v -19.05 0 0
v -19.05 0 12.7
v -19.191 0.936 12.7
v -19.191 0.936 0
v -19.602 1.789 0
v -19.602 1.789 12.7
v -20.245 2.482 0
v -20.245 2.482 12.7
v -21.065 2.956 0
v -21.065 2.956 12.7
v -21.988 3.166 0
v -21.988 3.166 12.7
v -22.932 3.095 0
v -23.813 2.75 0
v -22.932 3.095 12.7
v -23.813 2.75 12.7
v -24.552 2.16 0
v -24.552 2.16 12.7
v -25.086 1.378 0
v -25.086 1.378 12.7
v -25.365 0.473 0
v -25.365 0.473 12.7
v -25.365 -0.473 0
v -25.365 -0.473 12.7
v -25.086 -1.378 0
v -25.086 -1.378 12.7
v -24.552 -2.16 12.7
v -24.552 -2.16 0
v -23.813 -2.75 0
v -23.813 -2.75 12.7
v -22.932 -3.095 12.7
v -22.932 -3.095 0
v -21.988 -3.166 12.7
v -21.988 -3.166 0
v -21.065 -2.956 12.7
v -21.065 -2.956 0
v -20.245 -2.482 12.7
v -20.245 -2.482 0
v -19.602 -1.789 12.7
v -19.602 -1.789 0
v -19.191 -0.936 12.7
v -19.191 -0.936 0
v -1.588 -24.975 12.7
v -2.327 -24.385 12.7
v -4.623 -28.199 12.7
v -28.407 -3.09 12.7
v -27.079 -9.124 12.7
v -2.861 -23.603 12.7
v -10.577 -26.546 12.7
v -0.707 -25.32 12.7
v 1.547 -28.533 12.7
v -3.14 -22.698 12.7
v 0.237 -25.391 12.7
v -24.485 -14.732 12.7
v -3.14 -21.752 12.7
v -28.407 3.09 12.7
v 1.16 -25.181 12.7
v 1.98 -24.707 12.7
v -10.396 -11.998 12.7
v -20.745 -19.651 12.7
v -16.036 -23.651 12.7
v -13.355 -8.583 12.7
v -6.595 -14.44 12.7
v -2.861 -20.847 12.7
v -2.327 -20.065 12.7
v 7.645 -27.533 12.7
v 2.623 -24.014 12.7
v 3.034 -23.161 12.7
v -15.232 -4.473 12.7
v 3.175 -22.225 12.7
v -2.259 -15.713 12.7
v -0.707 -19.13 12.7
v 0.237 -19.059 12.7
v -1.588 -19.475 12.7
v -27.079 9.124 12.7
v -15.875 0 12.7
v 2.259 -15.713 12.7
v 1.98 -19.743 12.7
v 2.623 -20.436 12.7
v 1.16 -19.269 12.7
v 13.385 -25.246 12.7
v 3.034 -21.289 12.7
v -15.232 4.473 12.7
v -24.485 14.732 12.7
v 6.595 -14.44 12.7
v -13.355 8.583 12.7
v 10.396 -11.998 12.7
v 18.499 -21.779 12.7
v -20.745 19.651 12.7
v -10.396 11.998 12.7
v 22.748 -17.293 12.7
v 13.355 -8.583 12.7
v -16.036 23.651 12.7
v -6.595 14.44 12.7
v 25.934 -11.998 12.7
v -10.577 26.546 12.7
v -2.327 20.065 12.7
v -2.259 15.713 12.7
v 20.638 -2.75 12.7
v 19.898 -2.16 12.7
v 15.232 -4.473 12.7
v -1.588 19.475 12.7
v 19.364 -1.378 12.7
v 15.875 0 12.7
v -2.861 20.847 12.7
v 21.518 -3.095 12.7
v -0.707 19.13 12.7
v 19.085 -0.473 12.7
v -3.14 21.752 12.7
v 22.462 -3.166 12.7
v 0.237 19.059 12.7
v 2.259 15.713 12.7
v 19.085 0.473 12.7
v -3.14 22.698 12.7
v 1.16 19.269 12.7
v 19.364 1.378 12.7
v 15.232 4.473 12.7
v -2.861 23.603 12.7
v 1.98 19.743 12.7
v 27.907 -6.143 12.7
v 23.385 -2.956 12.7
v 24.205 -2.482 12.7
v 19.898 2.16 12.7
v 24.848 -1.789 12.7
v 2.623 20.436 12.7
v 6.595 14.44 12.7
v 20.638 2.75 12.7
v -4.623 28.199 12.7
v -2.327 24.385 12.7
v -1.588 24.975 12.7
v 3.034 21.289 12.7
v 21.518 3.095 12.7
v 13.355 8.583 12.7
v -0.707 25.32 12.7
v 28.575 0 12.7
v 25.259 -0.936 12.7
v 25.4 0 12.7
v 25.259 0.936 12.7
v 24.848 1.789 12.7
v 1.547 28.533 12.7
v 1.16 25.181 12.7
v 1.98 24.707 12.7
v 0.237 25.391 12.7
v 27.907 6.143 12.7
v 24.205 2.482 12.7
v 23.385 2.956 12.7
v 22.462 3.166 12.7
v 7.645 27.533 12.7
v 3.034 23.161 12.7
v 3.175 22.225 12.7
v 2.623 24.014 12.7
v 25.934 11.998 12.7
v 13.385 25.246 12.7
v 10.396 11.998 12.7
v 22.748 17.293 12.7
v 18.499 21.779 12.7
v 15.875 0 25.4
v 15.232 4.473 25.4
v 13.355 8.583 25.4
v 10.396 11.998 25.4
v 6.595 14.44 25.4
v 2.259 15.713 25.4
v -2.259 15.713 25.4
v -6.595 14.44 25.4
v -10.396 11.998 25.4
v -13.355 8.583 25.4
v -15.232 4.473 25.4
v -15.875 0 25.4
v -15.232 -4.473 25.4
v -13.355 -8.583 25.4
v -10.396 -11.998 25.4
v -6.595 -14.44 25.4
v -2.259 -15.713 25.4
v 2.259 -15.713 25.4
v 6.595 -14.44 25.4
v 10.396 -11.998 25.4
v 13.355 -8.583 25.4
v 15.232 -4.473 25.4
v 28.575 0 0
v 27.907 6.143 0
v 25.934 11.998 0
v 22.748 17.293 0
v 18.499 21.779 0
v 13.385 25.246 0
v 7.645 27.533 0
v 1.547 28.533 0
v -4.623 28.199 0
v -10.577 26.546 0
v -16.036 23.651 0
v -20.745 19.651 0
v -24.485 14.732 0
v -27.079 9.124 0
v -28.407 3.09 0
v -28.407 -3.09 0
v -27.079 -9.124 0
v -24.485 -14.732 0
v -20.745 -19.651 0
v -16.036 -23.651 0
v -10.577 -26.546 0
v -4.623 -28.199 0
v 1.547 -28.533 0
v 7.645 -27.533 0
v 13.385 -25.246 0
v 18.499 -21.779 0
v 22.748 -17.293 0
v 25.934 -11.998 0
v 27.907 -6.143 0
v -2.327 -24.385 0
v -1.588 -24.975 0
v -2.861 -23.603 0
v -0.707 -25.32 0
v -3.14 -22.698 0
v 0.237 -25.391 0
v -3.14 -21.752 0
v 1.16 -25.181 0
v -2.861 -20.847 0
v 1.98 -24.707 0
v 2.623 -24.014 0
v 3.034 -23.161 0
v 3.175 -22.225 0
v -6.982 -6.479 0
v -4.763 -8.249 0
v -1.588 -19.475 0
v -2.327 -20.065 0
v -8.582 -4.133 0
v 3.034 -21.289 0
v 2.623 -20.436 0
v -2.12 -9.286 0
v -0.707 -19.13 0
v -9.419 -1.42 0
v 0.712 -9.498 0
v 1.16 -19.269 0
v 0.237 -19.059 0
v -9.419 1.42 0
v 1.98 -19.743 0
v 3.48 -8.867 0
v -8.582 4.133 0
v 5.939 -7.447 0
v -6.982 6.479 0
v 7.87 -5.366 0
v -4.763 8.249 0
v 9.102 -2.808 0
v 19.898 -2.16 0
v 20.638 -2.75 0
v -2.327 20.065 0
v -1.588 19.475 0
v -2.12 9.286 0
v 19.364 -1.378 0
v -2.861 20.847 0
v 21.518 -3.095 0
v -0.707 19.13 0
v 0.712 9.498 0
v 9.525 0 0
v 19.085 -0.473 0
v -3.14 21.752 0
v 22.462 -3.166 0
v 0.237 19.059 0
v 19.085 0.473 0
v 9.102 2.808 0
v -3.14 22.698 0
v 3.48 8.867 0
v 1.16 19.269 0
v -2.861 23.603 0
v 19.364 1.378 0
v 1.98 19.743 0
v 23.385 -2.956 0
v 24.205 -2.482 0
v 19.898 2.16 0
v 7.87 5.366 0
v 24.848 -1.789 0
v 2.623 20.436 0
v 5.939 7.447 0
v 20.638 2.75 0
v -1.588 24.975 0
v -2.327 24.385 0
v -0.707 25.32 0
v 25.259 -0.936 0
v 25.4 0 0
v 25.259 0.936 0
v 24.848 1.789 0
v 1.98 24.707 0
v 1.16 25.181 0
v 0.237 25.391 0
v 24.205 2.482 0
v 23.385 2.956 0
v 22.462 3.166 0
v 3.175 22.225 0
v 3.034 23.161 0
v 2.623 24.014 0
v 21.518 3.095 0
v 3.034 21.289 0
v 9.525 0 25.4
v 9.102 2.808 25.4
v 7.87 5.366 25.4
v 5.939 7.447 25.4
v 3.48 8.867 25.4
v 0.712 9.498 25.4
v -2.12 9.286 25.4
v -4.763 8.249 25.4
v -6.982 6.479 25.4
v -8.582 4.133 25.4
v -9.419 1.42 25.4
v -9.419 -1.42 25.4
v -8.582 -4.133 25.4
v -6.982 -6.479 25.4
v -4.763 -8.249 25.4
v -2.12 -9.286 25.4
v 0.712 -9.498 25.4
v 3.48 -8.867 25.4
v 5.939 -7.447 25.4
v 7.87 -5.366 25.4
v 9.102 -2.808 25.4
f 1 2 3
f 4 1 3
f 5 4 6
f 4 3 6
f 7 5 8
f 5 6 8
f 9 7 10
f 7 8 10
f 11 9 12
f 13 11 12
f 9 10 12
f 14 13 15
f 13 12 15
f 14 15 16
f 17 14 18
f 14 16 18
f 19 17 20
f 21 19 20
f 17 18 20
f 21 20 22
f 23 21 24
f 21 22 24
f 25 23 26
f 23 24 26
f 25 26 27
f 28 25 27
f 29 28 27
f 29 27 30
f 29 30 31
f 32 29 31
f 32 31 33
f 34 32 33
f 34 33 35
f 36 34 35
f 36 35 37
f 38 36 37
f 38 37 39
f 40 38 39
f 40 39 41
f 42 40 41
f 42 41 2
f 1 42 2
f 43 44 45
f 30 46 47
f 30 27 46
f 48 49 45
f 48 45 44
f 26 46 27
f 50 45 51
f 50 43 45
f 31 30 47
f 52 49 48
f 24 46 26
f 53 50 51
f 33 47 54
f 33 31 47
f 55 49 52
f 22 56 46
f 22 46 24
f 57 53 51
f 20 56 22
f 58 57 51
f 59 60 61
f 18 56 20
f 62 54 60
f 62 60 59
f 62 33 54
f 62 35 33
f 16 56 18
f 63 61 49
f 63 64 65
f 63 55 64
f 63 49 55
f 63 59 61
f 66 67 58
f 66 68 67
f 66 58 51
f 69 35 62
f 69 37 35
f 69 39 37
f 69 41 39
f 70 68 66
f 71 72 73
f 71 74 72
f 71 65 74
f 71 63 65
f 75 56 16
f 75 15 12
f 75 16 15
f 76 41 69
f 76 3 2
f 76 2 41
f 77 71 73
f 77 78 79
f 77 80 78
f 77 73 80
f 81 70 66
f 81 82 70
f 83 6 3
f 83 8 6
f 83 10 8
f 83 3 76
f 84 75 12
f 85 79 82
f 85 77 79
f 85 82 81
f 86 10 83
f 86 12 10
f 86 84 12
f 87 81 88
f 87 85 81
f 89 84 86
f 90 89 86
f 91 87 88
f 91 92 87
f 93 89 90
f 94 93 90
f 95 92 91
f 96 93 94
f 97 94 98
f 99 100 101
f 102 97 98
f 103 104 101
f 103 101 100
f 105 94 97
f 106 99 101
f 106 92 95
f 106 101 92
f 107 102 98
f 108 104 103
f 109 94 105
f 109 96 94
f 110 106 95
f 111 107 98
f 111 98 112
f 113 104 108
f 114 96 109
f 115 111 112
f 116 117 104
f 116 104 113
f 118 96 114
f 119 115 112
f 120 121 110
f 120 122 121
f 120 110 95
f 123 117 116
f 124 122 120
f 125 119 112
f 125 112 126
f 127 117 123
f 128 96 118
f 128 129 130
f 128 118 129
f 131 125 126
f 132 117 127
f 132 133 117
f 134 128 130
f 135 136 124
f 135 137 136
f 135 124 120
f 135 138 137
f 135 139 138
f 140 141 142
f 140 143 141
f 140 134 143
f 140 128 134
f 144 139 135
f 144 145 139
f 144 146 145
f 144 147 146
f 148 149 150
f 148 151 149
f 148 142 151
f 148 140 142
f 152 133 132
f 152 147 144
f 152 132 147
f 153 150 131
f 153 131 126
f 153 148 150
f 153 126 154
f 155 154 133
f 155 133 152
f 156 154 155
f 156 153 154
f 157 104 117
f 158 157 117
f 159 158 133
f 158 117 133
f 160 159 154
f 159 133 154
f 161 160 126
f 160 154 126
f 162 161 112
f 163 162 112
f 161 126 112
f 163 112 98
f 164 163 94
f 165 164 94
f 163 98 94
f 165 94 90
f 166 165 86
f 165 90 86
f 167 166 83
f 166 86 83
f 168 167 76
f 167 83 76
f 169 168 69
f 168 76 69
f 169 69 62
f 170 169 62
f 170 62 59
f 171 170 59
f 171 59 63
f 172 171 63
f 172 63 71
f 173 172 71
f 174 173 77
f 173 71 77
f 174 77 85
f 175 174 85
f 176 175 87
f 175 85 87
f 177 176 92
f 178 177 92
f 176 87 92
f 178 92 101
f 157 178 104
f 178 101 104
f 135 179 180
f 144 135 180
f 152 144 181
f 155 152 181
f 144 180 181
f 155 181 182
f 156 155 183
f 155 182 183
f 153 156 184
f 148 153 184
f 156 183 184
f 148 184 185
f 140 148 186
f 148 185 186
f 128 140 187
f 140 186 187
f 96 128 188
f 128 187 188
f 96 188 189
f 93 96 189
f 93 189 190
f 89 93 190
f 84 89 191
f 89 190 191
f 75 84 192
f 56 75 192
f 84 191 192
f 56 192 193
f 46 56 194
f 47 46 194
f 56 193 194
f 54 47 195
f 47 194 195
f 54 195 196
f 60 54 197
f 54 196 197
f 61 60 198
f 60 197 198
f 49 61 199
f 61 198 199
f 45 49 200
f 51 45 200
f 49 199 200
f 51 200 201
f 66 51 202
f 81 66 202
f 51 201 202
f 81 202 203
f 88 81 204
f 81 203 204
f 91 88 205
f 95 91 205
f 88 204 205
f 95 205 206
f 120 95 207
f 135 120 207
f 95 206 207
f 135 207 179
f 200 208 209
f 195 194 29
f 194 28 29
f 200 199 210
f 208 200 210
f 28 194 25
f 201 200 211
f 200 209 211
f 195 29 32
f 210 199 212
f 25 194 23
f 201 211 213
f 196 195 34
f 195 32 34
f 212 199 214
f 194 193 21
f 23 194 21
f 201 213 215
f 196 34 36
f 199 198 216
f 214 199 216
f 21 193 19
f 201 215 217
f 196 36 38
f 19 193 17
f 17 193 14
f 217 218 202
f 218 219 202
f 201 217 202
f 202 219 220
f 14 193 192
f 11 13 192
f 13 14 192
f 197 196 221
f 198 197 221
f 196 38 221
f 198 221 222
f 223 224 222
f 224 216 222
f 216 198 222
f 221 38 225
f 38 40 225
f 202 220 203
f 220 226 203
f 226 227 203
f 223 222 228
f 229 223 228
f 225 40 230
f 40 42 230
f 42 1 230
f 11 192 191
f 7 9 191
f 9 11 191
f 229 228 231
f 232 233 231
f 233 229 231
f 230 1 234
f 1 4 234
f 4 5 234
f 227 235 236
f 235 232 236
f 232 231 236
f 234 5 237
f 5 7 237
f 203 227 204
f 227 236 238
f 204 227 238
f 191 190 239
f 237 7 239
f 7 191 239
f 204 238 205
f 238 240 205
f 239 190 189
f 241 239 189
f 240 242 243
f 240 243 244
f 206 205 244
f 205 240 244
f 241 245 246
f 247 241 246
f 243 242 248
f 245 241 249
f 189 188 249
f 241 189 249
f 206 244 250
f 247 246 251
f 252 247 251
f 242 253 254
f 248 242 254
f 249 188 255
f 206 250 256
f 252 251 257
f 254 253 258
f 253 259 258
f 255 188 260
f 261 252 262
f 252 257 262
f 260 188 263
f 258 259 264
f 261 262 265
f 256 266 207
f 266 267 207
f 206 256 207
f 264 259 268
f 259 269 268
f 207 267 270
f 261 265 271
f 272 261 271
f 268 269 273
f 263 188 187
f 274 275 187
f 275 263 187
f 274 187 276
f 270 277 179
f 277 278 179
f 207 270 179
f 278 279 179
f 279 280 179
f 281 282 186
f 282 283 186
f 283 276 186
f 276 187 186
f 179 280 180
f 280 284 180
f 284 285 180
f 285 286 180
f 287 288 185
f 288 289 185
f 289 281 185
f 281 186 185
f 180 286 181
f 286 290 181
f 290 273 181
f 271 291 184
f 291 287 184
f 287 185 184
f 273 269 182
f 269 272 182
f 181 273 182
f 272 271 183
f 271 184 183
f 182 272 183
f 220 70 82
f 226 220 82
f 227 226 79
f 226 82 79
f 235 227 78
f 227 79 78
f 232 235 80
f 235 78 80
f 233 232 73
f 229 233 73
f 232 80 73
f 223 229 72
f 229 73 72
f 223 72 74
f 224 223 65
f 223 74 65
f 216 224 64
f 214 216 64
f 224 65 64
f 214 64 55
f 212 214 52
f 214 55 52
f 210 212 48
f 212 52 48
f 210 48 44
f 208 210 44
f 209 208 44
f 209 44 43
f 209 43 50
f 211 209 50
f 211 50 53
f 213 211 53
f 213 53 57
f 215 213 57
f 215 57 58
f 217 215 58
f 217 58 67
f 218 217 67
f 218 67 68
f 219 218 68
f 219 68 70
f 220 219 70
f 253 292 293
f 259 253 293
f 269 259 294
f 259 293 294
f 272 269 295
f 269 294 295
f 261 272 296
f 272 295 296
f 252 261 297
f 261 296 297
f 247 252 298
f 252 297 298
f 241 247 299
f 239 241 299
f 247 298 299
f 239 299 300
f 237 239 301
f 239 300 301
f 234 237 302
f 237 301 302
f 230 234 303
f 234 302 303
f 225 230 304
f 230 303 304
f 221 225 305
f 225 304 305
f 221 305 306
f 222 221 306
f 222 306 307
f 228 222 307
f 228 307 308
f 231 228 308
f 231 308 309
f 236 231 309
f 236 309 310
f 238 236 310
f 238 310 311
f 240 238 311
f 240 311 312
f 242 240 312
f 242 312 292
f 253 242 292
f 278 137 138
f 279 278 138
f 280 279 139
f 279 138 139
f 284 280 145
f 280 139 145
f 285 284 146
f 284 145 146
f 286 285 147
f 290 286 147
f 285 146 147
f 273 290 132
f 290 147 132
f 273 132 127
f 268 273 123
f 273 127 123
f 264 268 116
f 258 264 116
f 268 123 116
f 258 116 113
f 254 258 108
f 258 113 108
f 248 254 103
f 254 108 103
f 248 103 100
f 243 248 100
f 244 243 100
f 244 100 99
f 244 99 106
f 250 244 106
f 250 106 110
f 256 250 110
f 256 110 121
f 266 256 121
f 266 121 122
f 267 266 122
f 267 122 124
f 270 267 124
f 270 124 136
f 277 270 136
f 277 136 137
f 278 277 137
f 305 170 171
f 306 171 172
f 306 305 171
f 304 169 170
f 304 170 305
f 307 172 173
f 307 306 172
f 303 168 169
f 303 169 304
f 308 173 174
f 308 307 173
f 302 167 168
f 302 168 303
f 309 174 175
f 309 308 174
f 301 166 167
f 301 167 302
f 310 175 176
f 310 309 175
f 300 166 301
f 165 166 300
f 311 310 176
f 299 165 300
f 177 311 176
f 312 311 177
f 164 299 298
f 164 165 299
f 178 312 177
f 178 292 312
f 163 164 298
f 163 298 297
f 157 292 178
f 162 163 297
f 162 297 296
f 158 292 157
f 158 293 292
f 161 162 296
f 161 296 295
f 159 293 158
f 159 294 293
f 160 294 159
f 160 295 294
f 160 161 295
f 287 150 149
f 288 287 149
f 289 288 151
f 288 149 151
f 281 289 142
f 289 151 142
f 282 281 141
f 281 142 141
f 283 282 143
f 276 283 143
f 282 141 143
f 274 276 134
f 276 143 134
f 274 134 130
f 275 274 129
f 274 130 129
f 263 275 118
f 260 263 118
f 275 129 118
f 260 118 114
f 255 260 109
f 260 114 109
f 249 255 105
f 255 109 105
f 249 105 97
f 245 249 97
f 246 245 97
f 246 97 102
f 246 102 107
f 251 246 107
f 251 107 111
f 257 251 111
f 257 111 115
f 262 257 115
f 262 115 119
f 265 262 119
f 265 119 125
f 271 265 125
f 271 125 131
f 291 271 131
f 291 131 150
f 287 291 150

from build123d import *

# Parameters (mm, degrees)
F0_R     = 28.575
F1_DEPTH = 12.7
F2_R     = 15.875
F3_DEPTH = 12.7
F4_R     = 9.525
F5_DEPTH = 25.401
F6_R     = 3.175
F7_DEPTH = 12.701


with BuildPart() as f1:
    # F0 (on Top) → F1 (new body)
    with BuildSketch(Plane.XY):
        Circle(F0_R)
    extrude(amount=F1_DEPTH)

    # F2 (on face) → F3 (join)
    with BuildSketch(Plane.XY.offset(12.7)):
        Circle(F2_R)
    extrude(amount=F3_DEPTH)

    # F4 (on face) → F5 (cut, through all)
    with BuildSketch(Plane.XY.offset(25.4)):
        Circle(F4_R)
    extrude(amount=-F5_DEPTH, mode=Mode.SUBTRACT)

    # F6 (on face) → F7 (cut, through all)
    with BuildSketch(Plane.XY.offset(12.7)):
        with Locations((0, 22.225)):
            Circle(F6_R)
        with Locations((22.225, 0)):
            Circle(F6_R)
        with Locations((-22.225, 0)):
            Circle(F6_R)
        with Locations((0, -22.225)):
            Circle(F6_R)
    extrude(amount=-F7_DEPTH, mode=Mode.SUBTRACT)


solid = f1.part
